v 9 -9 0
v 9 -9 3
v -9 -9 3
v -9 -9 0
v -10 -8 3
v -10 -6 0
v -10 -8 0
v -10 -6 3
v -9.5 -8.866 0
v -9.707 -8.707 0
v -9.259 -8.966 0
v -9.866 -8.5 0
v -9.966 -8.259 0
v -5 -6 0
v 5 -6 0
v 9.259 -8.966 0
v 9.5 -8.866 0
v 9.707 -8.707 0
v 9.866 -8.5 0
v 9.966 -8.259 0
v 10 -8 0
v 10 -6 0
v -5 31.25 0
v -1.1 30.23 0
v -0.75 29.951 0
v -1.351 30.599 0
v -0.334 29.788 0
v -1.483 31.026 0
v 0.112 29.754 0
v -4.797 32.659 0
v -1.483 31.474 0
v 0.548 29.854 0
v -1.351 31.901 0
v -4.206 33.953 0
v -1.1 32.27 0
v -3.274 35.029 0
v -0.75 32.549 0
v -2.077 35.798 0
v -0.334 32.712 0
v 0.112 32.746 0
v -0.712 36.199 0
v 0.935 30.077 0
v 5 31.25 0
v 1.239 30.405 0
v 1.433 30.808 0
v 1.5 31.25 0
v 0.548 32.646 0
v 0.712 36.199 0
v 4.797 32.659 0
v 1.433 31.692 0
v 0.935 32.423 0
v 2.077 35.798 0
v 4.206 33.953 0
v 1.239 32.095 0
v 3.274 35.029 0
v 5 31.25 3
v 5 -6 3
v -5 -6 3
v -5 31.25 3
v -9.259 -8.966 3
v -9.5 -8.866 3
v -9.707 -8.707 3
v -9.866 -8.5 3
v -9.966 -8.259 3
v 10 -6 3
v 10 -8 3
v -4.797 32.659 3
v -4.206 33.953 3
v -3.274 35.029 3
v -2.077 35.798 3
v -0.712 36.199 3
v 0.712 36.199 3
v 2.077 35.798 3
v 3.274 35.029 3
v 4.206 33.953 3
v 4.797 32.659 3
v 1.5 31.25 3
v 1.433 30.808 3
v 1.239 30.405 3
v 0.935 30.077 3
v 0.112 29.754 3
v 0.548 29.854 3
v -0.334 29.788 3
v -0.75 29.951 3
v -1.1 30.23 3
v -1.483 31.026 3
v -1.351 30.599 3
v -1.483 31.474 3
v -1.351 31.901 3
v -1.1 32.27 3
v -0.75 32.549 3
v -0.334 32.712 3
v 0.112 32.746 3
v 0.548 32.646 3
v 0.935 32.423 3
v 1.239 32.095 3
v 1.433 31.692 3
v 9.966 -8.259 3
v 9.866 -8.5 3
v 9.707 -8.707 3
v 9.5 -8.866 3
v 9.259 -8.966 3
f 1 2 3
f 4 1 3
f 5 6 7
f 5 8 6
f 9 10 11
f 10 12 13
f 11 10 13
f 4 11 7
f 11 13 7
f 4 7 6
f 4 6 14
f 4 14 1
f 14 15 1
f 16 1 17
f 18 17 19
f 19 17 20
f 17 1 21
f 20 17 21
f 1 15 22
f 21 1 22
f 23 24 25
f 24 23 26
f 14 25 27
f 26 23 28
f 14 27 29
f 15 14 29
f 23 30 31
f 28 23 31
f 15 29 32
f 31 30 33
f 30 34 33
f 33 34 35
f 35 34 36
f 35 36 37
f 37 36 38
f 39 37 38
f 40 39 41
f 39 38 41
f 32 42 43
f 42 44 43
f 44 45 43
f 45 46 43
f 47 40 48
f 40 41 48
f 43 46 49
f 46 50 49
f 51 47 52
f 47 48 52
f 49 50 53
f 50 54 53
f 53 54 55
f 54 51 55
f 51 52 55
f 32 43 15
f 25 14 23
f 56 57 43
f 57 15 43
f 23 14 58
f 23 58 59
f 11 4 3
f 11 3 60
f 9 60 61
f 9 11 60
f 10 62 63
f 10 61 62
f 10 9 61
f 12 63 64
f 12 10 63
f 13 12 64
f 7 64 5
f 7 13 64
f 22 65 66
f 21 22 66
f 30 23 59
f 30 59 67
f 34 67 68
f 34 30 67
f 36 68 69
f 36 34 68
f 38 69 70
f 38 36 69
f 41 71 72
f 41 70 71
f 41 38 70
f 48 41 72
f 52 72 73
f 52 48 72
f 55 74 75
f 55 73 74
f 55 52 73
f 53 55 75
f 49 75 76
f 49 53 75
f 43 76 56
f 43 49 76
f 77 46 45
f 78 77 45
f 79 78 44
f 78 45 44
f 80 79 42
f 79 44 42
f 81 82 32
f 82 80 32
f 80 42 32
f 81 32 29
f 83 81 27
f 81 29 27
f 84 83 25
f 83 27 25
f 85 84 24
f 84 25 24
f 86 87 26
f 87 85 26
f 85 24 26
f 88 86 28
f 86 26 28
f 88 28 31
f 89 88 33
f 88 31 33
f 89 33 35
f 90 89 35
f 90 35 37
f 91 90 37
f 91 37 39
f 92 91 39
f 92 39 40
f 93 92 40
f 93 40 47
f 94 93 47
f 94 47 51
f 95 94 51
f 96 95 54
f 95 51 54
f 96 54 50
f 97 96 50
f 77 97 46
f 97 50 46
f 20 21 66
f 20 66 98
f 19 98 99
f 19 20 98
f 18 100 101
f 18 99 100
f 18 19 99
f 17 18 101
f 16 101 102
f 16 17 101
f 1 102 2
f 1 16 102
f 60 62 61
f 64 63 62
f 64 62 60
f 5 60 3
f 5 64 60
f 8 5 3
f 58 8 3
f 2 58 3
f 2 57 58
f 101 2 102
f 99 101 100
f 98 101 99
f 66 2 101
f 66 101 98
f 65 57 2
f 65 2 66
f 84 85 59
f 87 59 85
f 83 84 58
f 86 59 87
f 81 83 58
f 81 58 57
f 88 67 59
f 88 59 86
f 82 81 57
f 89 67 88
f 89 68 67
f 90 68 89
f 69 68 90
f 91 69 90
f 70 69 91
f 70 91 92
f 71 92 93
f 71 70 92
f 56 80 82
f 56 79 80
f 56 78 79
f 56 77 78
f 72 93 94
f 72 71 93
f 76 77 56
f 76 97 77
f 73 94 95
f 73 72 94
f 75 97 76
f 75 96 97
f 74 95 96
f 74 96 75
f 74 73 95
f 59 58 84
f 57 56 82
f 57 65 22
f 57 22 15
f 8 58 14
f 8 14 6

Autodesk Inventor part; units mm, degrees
ref_plane "YZ Plane" through (0, 0, 0) normal (1, 0, 0) x (0, 1, 0)
ref_plane "XZ Plane" through (0, 0, 0) normal (0, 1, 0) x (-1, 0, 0)
ref_plane "XY Plane" through (0, 0, 0) normal (0, 0, 1) x (1, 0, 0)
sketch "Sketch1" plane through (0, 0, 0) normal (0, 0, 1) x (1, 0, 0)
  line L0 (5, -6) -> (-5, -6)
  circle A0 centre (0, 31.25) radius 1.5
  arc A1 (5, 31.25) -> (-5, 31.25) centre (0, 31.25) ccw
  line L1 (-5, -6) -> (-5, 31.25)
  line L2 (5, -6) -> (5, 31.25)
  point P0 (0, 0)
  point P1 (0, 0)
  point P2 (0, -6)
  point P3 (0, -6)
  dimension "d2" = 3
  dimension "d13" = 10
  dimension "d15" = 37.25
  dimension "d16" = 6
extrude "Extrusion1" add sketch "Sketch1" along normal blind 3
sketch "Sketch2" plane through (0, 0, 3) normal (0, 0, 1) x (1, 0, 0)
  line L0 (10, -6) -> (10, -9)
  line L1 (10, -9) -> (-10, -9)
  line L2 (-5, -6) -> (5, -6) projected
  line L3 (5, -6) -> (5, 31.25) projected
  line L4 (10, -6) -> (-10, -6)
  line L5 (-10, -6) -> (-10, -9)
  line L6 (-5, 31.25) -> (-5, -6) projected
  point P0 (0, 0)
  dimension "d5" = 3
  dimension "d17" = 5
  dimension "d18" = 5
extrude "Extrusion2" add sketch "Sketch2" against normal blind 3
fillet "Fillet1" radius 1 2 edges at (-10, -9, 1.5) (10, -9, 1.5)
properties part number "arm3"
